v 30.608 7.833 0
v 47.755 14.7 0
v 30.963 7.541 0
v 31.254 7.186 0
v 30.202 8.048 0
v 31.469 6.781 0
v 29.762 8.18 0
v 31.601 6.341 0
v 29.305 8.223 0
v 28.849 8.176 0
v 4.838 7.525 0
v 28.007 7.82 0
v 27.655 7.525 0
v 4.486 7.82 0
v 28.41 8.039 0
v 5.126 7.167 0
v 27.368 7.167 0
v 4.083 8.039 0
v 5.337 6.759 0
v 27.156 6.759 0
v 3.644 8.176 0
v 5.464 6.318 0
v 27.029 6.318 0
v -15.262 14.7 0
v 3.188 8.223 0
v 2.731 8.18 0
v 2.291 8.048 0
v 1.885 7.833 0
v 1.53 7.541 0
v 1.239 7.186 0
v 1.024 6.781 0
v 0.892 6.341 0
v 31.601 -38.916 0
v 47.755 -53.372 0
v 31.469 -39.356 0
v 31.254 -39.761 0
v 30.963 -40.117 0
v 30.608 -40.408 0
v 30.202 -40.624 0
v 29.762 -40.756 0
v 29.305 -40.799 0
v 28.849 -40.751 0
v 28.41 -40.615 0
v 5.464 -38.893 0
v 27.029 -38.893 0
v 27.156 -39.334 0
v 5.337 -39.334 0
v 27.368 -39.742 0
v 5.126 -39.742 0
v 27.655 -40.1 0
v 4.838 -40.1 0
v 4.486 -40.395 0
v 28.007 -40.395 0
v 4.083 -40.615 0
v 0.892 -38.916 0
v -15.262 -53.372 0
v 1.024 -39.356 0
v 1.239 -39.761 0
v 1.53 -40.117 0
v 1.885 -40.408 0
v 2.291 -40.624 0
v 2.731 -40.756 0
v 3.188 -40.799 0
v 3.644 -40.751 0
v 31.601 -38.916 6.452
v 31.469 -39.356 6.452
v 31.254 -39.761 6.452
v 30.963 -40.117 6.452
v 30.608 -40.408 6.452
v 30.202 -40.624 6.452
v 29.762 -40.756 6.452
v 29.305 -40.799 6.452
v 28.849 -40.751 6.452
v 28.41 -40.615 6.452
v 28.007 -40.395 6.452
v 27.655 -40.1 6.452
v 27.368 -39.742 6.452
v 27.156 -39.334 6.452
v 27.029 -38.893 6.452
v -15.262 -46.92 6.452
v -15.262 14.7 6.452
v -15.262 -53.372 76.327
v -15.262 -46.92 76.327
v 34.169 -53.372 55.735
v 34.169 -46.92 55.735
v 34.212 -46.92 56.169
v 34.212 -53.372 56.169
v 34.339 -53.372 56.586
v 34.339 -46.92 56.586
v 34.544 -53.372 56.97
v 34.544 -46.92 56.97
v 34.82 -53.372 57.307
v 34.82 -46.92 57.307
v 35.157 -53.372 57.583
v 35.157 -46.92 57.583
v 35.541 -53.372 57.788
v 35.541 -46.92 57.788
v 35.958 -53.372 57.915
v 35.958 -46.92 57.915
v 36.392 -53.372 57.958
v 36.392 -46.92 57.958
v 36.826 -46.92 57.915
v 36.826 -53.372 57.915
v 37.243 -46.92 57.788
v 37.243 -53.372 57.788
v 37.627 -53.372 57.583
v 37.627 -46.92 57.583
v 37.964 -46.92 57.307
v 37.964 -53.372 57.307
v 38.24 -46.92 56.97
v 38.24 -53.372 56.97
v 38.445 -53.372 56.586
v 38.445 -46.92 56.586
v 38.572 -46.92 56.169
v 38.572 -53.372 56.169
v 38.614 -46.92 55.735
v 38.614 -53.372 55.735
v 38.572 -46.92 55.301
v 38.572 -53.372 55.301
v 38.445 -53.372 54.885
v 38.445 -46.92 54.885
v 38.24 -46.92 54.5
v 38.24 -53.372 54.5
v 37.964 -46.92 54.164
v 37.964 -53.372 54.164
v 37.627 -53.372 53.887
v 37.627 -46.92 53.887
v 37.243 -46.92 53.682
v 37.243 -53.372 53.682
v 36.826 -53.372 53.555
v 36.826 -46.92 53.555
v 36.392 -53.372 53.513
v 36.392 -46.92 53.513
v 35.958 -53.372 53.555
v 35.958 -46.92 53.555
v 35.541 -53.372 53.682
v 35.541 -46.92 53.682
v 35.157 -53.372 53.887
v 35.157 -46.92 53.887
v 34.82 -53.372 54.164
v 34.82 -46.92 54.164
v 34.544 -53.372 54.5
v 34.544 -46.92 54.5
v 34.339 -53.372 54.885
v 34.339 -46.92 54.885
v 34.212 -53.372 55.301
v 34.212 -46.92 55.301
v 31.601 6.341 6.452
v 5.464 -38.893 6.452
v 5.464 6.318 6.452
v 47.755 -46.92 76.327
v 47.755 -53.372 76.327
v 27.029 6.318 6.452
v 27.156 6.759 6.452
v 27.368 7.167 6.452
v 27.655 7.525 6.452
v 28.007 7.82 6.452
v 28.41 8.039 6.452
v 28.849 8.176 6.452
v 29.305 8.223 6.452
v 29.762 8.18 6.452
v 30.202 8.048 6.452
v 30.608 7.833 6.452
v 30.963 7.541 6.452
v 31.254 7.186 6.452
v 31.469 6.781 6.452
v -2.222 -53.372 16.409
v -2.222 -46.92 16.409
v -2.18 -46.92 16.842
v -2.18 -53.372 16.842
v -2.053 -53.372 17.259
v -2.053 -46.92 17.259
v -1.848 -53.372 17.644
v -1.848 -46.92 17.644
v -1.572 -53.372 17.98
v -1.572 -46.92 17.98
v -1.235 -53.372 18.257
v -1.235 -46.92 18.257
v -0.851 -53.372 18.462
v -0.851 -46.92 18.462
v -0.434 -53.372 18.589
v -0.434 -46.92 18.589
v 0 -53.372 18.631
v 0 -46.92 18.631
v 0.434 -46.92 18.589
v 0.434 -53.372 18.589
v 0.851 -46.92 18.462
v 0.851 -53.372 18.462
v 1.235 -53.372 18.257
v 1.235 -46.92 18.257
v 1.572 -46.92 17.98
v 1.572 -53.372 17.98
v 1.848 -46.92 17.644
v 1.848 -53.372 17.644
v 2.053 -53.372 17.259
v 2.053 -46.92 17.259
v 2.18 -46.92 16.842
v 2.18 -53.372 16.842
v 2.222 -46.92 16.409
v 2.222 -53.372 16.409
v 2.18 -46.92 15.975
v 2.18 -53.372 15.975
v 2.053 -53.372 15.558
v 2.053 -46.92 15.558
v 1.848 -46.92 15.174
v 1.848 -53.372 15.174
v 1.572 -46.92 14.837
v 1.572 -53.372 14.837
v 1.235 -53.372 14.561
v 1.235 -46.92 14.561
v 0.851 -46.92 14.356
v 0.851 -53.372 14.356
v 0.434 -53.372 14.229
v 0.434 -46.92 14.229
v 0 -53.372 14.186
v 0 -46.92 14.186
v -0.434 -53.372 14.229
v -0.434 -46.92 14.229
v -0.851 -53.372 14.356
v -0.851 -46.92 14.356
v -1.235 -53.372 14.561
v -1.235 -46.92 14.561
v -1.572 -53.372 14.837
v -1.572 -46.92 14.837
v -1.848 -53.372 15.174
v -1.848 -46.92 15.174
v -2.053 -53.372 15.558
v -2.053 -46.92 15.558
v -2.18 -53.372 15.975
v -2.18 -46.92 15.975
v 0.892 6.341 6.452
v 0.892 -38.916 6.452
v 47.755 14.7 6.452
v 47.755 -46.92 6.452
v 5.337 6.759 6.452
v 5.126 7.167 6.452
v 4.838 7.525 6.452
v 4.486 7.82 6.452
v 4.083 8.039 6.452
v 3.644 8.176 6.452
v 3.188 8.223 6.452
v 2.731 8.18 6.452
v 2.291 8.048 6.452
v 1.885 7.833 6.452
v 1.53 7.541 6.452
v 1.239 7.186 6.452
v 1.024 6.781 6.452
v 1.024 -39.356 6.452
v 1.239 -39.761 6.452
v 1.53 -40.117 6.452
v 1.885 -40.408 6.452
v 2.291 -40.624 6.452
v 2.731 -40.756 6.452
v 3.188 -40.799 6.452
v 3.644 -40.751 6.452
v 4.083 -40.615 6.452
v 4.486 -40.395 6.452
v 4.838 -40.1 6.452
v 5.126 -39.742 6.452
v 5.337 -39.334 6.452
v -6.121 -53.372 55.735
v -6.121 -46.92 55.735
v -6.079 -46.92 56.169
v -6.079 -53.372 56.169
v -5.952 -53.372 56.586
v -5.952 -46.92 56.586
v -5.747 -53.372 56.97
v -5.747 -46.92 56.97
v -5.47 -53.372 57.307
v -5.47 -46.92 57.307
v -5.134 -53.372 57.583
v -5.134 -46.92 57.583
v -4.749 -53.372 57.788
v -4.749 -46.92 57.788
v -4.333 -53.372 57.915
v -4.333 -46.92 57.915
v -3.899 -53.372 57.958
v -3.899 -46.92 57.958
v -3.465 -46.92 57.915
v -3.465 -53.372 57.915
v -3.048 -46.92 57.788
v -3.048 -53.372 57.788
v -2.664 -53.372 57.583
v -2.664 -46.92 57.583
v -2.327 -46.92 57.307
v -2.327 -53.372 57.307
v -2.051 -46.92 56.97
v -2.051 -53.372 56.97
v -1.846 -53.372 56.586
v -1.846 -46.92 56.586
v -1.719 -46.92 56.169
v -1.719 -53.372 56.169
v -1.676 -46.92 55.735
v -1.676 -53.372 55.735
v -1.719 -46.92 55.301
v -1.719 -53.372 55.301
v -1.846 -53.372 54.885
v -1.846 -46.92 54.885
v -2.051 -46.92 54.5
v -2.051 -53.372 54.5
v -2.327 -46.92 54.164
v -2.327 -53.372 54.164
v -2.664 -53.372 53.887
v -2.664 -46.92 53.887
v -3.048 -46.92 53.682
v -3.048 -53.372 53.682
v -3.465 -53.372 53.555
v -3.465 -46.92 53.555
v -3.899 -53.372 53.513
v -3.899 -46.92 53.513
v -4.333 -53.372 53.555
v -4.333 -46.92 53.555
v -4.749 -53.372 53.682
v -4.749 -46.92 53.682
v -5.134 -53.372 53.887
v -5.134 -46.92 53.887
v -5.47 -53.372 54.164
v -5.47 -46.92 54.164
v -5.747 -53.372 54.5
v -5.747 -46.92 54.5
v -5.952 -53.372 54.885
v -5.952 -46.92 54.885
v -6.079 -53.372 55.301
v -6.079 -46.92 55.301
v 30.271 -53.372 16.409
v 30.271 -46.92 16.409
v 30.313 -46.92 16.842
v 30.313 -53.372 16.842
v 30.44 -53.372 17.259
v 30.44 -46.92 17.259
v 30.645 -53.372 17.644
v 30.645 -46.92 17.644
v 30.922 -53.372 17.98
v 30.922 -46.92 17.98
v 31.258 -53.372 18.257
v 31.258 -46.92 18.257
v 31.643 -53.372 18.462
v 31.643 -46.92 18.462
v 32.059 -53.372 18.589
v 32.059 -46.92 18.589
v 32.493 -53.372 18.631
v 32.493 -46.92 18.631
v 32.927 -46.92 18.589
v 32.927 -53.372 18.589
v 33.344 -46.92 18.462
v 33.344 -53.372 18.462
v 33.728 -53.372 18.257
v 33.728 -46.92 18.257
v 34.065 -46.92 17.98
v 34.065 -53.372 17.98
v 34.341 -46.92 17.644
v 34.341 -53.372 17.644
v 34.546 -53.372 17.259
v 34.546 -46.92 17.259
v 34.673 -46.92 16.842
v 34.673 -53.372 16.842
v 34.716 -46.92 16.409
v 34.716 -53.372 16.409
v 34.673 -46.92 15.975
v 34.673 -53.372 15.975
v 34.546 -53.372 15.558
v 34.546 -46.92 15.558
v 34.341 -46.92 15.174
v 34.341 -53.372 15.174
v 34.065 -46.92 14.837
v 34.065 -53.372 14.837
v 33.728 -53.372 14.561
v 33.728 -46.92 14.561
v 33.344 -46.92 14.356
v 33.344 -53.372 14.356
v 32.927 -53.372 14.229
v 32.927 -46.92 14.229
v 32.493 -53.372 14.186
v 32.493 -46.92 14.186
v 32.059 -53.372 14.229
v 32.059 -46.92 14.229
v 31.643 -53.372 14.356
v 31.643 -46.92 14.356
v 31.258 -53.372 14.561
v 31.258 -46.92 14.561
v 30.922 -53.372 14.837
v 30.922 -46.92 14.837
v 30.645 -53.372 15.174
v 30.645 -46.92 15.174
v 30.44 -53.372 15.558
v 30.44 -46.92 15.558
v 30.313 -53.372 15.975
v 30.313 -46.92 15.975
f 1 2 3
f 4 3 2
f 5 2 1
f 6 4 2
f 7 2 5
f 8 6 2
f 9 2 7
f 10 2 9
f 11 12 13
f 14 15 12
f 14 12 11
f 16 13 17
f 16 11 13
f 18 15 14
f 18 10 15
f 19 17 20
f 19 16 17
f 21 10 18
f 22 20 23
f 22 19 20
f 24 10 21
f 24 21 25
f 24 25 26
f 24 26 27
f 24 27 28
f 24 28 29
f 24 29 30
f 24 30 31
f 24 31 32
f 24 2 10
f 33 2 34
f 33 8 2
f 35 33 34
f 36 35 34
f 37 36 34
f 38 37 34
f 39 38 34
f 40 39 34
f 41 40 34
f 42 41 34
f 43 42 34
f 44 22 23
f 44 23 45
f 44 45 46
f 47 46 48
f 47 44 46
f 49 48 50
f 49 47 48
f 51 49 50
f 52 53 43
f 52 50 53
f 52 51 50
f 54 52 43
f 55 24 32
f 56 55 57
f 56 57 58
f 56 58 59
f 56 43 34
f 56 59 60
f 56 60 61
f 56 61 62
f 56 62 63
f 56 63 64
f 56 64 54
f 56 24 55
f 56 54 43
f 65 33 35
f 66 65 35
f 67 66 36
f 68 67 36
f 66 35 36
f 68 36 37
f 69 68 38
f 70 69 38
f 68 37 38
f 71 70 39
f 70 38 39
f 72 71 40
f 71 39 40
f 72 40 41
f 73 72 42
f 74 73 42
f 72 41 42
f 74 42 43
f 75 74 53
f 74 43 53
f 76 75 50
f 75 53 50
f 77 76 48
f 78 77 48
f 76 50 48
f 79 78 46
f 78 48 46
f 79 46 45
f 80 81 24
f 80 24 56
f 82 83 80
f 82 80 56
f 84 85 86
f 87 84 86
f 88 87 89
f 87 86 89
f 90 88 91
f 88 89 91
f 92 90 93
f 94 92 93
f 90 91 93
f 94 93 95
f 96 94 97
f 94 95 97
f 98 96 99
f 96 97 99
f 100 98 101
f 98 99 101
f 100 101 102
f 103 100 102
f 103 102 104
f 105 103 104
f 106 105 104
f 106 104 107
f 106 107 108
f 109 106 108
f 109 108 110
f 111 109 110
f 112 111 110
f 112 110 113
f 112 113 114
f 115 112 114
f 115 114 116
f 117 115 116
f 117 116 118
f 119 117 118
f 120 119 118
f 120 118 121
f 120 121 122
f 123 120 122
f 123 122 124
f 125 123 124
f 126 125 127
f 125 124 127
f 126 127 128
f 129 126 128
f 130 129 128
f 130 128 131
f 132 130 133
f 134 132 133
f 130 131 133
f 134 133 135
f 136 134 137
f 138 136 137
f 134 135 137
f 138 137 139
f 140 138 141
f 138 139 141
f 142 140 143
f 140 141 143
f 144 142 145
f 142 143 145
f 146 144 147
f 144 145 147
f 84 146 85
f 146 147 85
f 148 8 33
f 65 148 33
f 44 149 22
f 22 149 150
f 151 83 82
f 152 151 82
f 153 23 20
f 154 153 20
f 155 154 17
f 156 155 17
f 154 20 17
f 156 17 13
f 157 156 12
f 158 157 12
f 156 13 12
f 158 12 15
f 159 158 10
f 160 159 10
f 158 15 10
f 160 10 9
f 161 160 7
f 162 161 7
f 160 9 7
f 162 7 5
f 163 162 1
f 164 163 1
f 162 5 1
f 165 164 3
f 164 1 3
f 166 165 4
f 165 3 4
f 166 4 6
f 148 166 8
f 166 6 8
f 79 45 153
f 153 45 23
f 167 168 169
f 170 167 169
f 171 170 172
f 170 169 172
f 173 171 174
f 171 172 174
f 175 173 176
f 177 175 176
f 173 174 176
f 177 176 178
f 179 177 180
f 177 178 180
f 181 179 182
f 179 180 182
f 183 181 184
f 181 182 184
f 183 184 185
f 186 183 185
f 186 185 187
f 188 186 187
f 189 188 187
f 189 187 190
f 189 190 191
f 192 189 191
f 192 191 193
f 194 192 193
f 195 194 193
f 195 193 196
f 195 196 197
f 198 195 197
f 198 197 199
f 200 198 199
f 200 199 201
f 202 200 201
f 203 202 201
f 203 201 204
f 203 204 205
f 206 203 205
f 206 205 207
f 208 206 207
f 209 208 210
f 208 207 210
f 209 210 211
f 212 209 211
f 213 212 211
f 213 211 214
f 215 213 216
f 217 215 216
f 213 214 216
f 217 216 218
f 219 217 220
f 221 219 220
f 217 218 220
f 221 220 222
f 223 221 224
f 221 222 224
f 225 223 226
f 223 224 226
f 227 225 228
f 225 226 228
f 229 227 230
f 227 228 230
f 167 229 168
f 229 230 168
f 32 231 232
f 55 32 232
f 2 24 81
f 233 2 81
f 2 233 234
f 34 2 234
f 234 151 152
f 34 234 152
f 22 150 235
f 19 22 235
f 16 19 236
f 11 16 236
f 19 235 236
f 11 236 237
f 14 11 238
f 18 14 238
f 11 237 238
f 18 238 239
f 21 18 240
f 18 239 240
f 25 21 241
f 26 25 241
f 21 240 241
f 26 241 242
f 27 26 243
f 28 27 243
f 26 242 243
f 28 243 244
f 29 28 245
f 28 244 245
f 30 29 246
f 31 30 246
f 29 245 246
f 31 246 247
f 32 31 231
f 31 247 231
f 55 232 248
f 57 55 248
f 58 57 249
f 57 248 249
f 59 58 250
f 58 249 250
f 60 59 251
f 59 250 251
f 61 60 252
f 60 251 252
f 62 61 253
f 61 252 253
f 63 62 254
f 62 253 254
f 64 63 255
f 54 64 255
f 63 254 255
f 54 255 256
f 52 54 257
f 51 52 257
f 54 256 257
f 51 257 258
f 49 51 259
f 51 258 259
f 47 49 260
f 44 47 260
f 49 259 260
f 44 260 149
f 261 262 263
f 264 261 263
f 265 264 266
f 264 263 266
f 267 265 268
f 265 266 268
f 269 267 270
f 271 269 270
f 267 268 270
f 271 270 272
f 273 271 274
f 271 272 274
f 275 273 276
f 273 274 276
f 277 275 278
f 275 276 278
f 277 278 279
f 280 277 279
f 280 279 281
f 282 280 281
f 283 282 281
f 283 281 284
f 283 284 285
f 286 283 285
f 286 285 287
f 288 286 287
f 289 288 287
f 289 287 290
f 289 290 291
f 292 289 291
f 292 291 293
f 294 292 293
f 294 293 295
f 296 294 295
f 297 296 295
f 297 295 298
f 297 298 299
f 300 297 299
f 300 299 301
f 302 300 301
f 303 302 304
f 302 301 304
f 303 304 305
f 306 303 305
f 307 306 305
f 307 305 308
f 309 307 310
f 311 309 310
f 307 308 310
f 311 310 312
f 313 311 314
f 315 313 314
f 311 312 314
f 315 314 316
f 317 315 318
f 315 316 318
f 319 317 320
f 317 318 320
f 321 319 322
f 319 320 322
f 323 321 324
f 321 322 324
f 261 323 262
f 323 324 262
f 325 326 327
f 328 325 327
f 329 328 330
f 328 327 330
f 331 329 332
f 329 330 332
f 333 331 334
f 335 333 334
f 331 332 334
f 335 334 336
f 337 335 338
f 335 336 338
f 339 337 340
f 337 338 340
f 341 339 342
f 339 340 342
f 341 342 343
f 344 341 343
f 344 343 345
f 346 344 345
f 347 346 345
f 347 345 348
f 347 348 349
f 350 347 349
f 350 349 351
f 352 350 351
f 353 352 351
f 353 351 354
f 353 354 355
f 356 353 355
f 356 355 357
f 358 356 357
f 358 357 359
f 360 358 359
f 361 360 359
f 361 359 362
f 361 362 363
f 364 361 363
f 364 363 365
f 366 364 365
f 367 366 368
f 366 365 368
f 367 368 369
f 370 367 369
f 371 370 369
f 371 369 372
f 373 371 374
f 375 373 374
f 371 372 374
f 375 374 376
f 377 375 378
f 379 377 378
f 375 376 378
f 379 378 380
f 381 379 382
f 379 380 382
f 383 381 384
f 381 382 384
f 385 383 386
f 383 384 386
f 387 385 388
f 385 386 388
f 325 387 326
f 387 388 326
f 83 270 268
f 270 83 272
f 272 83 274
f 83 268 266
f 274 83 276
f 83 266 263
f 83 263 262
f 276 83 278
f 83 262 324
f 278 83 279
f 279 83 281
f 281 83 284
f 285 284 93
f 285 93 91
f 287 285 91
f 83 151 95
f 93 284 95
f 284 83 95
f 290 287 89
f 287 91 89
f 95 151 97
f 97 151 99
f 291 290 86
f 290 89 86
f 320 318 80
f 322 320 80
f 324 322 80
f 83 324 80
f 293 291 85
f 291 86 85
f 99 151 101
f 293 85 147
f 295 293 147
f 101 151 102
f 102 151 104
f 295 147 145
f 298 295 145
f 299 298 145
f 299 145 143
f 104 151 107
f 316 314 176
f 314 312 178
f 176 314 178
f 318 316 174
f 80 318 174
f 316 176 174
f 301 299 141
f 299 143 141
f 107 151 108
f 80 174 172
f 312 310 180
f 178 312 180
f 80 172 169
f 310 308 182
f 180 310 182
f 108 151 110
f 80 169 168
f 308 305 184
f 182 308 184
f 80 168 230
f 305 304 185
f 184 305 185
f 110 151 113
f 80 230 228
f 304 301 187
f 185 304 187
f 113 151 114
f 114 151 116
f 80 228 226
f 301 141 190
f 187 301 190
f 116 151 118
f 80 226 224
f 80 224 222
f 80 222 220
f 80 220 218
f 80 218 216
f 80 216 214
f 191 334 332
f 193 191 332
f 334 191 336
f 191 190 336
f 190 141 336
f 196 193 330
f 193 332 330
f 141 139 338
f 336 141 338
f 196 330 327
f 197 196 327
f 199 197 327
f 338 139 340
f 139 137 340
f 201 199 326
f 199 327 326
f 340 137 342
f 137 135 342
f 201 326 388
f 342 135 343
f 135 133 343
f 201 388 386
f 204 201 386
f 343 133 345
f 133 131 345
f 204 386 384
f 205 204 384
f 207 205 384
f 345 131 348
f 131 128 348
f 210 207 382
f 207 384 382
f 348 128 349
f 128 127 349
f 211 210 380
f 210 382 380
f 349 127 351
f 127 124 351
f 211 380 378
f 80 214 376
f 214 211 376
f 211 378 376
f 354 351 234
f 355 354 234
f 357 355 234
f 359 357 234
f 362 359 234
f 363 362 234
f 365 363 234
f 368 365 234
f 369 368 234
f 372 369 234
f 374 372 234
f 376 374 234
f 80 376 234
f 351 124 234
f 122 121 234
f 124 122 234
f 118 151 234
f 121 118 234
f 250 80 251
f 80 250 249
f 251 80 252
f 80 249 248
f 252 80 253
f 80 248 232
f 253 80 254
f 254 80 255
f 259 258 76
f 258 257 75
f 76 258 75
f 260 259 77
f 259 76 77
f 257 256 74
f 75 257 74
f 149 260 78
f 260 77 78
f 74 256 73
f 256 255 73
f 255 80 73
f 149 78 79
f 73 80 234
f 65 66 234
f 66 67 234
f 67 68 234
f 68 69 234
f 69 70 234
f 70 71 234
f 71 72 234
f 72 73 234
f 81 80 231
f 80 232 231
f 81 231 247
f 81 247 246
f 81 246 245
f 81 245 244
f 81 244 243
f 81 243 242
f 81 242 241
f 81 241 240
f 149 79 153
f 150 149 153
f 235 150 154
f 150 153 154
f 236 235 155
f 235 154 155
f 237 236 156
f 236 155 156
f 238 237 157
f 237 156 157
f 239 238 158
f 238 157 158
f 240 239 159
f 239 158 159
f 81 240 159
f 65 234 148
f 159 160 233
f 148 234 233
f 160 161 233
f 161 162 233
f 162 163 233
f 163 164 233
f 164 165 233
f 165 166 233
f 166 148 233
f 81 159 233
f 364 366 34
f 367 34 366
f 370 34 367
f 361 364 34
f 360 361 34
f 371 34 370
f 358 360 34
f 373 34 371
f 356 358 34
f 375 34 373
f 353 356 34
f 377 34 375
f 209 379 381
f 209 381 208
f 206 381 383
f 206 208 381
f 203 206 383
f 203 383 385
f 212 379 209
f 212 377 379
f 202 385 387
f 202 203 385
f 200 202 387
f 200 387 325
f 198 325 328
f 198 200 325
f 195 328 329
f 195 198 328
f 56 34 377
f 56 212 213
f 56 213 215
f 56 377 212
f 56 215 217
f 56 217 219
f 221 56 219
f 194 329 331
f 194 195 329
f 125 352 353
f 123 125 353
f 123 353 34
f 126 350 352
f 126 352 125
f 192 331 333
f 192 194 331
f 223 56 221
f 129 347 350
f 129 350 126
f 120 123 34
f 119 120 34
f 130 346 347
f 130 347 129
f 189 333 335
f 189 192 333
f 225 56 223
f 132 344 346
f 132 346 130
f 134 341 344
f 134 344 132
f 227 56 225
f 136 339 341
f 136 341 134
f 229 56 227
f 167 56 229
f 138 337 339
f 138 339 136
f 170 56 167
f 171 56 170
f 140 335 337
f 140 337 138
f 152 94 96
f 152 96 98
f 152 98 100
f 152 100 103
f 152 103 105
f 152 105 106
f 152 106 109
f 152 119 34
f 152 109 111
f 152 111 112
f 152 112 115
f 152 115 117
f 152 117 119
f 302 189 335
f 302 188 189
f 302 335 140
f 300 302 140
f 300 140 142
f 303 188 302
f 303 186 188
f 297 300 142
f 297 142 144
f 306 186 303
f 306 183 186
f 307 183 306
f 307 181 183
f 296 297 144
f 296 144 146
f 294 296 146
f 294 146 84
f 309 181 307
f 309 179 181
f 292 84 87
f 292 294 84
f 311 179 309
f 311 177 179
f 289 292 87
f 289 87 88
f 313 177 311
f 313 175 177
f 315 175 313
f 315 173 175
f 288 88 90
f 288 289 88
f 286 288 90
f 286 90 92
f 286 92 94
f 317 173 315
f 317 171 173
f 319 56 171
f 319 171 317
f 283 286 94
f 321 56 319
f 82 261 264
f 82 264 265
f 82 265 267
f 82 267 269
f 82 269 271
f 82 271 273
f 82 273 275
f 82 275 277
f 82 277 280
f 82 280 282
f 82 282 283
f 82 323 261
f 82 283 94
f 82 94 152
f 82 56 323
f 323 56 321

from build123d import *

# Parameters (mm, degrees)
SKETCH1_W                = 68.072
SKETCH1_H                = 76.327
BOSS_EXTRUDE1_DEPTH      = 63.0174
SKETCH2_W                = 69.8754
SKETCH2_H                = 61.6204
CUT_EXTRUDE1_DEPTH       = 113.452363516
CUT_EXTRUDE2_DEPTH       = 101.05830175
CUT_EXTRUDE3_DEPTH       = 105.665673231
M4_CLEARANCE_HOLE1_D     = 4.445
M4_CLEARANCE_HOLE1_DEPTH = 68.072


with BuildPart() as part:
    # Sketch1 → Boss-Extrude1 (new body)
    with BuildSketch(Plane(origin=(-15.262172061, 0, 0), x_dir=(0, -1, 0), z_dir=(-1, 0, 0))):
        with Locations((19.335625687, 38.1635)):
            Rectangle(SKETCH1_W, SKETCH1_H)
    extrude(amount=-BOSS_EXTRUDE1_DEPTH)

    # Sketch2 → Cut-Extrude1 (cut, through all)
    with BuildSketch(Plane(origin=(47.755227939, 0, 0), x_dir=(0, 0, -1), z_dir=(1, 0, 0))):
        with Locations((-41.3893, -16.109825687)):
            Rectangle(SKETCH2_W, SKETCH2_H)
    extrude(amount=-CUT_EXTRUDE1_DEPTH, mode=Mode.SUBTRACT)

    # Sketch3 → Cut-Extrude2 (cut, through all)
    with BuildSketch(Plane.XY.offset(6.4516)):
        with BuildLine():
            Line((5.464227939, -38.893127295), (5.464227939, 6.317876942))
            ThreePointArc((5.464227939, 6.317876942), (3.187772185, 8.223345793), (0.892227939, 6.340916789))
            Line((0.892227939, 6.340916789), (0.892227939, -38.916167142))
            ThreePointArc((0.892227939, -38.916167142), (3.187772185, -40.798596146), (5.464227939, -38.893127295))
        make_face()
    extrude(amount=-CUT_EXTRUDE2_DEPTH, mode=Mode.SUBTRACT)

    # Sketch4 → Cut-Extrude3 (cut, through all)
    with BuildSketch(Plane(origin=(0, 0, 0), x_dir=(-1, 0, 0), z_dir=(0, 0, -1))):
        with BuildLine():
            Line((-27.028827939, -38.893127295), (-27.028827939, 6.317876942))
            ThreePointArc((-27.028827939, 6.317876942), (-29.305283692, 8.223345793), (-31.600827939, 6.340916789))
            Line((-31.600827939, 6.340916789), (-31.600827939, -38.916167142))
            ThreePointArc((-31.600827939, -38.916167142), (-29.305283692, -40.798596146), (-27.028827939, -38.893127295))
        make_face()
    extrude(amount=-CUT_EXTRUDE3_DEPTH, mode=Mode.SUBTRACT)

    # M4 Clearance Hole1
    with Locations(Plane.XZ.offset(53.371625687)):
        with Locations((32.493055877, 16.408909131), (0, 16.408909131), (36.391998544, 55.735080284), (-3.898942667, 55.735080284)):
            Hole(M4_CLEARANCE_HOLE1_D / 2, depth=M4_CLEARANCE_HOLE1_DEPTH)


solid = part.part
